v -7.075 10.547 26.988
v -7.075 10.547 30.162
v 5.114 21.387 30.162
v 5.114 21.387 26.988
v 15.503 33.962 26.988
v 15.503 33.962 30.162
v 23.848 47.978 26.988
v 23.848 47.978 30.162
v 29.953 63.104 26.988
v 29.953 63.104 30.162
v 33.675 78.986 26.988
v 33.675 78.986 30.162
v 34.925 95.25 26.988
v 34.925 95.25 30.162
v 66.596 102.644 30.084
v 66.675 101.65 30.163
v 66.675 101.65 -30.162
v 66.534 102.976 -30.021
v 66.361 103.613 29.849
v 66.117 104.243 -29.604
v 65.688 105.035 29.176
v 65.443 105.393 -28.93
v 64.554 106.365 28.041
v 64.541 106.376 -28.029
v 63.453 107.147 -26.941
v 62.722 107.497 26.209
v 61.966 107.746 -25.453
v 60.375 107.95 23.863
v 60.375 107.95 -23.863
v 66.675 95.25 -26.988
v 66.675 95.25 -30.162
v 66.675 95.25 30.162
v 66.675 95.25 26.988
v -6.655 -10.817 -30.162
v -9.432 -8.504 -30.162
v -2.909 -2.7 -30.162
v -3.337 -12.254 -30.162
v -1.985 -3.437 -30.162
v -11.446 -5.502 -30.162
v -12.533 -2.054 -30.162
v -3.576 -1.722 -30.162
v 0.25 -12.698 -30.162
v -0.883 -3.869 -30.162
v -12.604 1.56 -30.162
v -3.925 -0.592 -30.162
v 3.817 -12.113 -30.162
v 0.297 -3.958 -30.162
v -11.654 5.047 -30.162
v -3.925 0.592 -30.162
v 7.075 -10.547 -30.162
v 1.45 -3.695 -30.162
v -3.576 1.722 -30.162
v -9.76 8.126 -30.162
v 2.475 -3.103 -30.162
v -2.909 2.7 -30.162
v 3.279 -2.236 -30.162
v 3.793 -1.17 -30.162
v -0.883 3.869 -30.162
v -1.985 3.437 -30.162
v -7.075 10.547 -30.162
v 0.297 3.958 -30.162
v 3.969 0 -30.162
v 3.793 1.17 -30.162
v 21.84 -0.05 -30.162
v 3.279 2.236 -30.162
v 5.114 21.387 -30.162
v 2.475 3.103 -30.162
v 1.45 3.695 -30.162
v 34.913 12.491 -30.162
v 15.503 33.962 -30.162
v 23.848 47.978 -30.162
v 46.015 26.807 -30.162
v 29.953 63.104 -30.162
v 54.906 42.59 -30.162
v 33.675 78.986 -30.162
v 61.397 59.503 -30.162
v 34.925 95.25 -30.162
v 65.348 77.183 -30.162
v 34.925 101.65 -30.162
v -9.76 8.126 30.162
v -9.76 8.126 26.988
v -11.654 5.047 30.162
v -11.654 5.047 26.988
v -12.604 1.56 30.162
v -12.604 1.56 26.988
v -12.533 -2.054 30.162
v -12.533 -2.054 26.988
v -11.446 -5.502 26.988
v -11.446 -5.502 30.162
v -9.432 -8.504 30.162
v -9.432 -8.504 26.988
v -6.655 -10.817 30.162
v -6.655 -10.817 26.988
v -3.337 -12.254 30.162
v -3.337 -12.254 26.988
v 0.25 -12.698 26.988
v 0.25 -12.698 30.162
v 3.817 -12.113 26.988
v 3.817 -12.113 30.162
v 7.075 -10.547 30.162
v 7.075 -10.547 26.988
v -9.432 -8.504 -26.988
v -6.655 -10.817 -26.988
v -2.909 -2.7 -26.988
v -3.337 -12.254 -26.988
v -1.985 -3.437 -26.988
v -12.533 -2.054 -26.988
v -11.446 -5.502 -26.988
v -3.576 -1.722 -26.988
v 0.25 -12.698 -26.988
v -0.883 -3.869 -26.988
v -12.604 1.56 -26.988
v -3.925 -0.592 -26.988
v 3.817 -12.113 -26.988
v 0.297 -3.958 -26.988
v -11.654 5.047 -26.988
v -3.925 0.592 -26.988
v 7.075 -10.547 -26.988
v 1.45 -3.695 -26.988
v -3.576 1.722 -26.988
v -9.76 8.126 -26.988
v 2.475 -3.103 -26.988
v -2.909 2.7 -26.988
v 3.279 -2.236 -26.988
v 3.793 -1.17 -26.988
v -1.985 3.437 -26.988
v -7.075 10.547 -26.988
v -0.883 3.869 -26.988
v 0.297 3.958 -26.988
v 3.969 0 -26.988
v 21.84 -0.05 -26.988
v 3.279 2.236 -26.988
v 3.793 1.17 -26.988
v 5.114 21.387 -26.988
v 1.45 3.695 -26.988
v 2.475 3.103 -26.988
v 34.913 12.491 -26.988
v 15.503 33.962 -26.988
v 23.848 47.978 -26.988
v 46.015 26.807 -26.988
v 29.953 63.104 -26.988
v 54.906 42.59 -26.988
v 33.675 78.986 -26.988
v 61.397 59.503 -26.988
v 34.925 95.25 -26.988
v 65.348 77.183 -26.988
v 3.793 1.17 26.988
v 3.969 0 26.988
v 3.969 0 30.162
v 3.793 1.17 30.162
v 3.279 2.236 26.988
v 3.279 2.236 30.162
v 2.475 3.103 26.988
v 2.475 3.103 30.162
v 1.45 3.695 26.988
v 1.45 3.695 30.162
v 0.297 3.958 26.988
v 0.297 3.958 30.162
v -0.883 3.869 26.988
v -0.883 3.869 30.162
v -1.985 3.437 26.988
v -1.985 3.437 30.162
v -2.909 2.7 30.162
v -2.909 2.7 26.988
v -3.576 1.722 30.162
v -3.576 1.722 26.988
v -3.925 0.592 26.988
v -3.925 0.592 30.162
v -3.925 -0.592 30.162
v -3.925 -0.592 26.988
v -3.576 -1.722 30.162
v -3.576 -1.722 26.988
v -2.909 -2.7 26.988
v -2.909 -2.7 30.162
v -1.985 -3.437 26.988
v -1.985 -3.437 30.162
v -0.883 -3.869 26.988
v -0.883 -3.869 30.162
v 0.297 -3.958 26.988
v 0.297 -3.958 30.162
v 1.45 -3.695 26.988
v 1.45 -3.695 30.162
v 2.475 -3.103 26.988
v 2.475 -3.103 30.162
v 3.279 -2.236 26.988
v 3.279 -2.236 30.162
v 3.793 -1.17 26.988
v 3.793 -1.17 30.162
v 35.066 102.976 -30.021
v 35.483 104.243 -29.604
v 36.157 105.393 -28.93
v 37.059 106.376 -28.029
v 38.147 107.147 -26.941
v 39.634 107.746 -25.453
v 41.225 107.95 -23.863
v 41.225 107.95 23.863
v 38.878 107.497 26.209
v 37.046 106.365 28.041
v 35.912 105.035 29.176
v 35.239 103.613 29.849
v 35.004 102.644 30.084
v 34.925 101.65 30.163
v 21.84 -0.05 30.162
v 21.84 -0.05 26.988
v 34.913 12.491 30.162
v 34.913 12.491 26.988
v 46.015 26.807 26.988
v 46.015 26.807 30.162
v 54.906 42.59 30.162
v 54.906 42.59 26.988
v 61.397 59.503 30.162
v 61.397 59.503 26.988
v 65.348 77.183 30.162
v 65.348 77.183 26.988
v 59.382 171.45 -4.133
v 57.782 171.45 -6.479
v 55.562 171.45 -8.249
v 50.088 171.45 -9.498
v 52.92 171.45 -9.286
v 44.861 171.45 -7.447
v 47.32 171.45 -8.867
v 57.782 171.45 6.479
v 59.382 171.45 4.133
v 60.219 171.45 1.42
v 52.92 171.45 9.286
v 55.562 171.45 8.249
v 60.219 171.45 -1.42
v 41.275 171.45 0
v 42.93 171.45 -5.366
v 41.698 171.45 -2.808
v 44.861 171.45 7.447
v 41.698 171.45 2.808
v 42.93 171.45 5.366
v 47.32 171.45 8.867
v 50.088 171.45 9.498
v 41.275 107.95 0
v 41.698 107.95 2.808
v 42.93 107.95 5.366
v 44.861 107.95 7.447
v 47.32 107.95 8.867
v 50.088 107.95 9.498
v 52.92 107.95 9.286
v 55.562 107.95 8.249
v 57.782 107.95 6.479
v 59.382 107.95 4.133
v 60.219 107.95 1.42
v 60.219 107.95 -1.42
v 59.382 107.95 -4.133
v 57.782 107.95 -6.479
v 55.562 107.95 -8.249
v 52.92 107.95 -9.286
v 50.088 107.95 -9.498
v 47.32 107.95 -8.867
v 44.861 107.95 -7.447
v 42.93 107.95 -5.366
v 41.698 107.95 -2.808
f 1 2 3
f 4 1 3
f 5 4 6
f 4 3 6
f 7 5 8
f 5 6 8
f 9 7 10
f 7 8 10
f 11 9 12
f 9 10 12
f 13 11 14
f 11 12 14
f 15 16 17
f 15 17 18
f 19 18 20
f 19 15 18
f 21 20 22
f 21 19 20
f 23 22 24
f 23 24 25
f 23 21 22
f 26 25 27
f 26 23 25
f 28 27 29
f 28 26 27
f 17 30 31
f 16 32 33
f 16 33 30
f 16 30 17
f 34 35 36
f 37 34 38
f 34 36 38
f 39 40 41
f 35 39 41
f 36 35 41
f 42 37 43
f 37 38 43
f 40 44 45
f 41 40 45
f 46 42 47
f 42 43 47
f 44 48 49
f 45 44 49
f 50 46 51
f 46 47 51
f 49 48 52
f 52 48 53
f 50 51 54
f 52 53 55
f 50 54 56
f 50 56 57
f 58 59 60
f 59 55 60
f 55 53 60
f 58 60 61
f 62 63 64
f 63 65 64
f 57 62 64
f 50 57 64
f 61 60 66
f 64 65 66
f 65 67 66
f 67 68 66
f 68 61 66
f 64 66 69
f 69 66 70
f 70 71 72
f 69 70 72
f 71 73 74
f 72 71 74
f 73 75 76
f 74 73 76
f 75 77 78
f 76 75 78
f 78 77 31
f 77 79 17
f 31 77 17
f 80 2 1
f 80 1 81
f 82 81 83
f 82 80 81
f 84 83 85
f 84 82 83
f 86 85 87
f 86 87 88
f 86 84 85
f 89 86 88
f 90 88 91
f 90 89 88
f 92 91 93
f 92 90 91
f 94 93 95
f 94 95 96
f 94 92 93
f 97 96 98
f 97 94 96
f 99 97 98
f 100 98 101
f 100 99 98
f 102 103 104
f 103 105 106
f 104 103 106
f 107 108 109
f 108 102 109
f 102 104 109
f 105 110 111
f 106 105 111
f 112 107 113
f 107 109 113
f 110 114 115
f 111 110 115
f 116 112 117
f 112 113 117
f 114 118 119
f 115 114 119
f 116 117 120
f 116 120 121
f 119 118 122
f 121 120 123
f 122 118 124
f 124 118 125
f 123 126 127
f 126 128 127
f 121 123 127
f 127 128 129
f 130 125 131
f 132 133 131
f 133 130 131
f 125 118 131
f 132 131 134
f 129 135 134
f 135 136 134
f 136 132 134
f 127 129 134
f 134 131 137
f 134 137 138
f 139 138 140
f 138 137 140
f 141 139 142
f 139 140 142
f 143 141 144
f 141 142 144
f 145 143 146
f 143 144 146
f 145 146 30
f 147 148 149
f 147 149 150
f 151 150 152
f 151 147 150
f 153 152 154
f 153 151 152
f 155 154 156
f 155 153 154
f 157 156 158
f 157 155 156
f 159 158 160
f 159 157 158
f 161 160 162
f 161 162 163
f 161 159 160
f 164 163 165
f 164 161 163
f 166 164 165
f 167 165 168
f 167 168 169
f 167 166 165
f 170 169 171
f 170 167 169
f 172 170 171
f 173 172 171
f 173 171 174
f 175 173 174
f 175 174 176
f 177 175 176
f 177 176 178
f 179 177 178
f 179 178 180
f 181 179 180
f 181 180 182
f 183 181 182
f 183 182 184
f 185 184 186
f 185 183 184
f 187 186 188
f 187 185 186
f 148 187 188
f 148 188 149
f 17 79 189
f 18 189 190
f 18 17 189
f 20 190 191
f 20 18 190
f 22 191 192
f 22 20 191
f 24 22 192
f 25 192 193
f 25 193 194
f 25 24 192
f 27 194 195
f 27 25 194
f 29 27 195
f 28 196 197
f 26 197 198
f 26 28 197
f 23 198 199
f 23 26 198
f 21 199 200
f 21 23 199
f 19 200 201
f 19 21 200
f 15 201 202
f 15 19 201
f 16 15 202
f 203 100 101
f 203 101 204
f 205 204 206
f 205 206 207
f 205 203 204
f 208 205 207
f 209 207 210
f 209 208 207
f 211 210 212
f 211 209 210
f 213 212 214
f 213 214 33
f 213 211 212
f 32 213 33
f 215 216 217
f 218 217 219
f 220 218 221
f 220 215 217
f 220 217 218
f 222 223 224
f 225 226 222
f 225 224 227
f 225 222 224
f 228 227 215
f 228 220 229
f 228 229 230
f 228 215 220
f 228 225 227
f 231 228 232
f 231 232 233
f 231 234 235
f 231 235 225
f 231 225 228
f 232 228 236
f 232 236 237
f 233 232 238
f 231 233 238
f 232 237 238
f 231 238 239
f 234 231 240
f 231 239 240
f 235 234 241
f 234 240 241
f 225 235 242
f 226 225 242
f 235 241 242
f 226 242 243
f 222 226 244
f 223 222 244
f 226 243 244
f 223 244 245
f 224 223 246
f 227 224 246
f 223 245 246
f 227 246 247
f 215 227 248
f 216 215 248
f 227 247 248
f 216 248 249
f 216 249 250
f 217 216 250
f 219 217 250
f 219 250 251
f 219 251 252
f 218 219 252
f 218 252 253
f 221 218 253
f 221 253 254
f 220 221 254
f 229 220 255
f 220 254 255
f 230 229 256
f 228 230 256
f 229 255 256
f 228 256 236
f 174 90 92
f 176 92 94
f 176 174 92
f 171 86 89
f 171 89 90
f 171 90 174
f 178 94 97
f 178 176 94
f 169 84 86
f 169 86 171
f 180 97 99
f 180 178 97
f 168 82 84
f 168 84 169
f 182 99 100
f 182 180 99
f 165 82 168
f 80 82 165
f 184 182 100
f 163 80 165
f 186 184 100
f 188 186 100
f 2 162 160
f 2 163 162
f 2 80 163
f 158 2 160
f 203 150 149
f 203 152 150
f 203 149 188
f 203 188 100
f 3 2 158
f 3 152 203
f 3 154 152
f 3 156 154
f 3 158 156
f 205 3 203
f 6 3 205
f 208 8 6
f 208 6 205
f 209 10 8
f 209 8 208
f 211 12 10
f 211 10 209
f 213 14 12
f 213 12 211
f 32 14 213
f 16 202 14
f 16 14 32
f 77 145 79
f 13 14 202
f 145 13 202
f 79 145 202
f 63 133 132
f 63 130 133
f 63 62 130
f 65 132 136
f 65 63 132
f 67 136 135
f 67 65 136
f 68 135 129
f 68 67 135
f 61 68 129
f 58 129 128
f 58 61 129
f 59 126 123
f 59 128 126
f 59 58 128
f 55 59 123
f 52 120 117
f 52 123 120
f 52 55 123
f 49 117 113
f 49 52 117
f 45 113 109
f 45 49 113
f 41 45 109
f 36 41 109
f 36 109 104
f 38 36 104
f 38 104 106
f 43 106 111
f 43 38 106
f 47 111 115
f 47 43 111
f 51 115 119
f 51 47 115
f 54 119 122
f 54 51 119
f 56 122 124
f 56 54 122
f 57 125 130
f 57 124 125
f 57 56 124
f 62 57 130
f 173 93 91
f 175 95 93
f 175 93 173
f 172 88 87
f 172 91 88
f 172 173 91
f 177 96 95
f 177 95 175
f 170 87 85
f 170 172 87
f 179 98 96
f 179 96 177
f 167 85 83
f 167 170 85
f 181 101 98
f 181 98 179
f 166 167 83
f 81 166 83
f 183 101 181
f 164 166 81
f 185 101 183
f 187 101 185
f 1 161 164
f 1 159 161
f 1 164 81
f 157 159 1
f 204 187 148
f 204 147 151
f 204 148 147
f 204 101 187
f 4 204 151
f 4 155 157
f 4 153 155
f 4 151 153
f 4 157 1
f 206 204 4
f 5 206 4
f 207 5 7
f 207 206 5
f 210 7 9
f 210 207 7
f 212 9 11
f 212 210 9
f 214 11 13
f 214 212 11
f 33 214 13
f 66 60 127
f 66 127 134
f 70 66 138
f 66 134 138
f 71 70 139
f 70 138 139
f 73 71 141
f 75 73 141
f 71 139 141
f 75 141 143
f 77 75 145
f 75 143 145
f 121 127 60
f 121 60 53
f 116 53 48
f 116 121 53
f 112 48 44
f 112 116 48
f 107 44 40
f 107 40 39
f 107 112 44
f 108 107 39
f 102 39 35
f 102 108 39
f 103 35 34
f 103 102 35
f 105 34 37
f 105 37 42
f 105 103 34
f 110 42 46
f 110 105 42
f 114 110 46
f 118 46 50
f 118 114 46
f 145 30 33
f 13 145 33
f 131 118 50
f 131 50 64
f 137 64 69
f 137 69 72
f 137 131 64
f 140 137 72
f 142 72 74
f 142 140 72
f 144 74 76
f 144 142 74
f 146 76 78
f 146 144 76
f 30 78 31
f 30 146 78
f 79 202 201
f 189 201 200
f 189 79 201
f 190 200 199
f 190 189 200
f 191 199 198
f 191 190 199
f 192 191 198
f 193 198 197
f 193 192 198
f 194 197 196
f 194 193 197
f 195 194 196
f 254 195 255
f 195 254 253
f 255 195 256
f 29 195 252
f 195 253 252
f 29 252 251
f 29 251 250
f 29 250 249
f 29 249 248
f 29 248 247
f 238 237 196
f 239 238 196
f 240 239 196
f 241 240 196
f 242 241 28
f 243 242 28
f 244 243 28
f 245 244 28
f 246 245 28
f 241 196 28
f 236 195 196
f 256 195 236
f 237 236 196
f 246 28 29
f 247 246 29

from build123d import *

# Parameters (mm, degrees)
SKETCH_R     = 3.969
PAD_DEPTH    = 30.1625
SKETCH001_W  = 127
SKETCH001_H  = 53.975
POCKET_DEPTH = 79.376
SKETCH002_R  = 9.525
PAD001_DEPTH = 63.5
FILLET_R     = 6.3


with BuildPart() as part:
    # Sketch → Pad (new body, symmetric)
    with BuildSketch(Plane.XY):
        with BuildLine():
            ThreePointArc((-7.075094, 10.546707), (-10.546707, -7.075094), (7.075094, -10.546707))
            ThreePointArc((7.075094, -10.546707), (50.749937, 34.535315), (66.675, 95.25))
            Line((66.675, 95.25), (66.675, 107.95))
            Line((34.925, 107.95), (66.675, 107.95))
            Line((34.925, 95.25), (34.925, 107.95))
            ThreePointArc((-7.075094, 10.546707), (23.848498, 47.977768), (34.925, 95.25))
        make_face()
        Circle(SKETCH_R, mode=Mode.SUBTRACT)
    extrude(amount=PAD_DEPTH, both=True)

    # Sketch001 (on Face4 of Pad) → Pocket (cut, through all)
    with BuildSketch(Plane.YZ.offset(66.675)):
        with Locations((31.75, 0)):
            Rectangle(SKETCH001_W, SKETCH001_H)
    extrude(amount=-POCKET_DEPTH, mode=Mode.SUBTRACT)

    # Sketch002 (on Face8 of Pocket) → Pad001 (join)
    with BuildSketch(Plane(origin=(0, 107.95, 0), x_dir=(-1, 0, 0), z_dir=(0, 1, 0))):
        with Locations((-50.8, 0)):
            Circle(SKETCH002_R)
    extrude(amount=PAD001_DEPTH)

    # Fillet
    fillet_edges = [part.edges().sort_by_distance(p)[0] for p in [
        (50.8, 107.95, 30.1625),
        (66.675, 107.95, 0),
        (34.925, 107.95, 0),
        (50.8, 107.95, -30.1625),
    ]]
    fillet(fillet_edges, radius=FILLET_R)


solid = part.part
